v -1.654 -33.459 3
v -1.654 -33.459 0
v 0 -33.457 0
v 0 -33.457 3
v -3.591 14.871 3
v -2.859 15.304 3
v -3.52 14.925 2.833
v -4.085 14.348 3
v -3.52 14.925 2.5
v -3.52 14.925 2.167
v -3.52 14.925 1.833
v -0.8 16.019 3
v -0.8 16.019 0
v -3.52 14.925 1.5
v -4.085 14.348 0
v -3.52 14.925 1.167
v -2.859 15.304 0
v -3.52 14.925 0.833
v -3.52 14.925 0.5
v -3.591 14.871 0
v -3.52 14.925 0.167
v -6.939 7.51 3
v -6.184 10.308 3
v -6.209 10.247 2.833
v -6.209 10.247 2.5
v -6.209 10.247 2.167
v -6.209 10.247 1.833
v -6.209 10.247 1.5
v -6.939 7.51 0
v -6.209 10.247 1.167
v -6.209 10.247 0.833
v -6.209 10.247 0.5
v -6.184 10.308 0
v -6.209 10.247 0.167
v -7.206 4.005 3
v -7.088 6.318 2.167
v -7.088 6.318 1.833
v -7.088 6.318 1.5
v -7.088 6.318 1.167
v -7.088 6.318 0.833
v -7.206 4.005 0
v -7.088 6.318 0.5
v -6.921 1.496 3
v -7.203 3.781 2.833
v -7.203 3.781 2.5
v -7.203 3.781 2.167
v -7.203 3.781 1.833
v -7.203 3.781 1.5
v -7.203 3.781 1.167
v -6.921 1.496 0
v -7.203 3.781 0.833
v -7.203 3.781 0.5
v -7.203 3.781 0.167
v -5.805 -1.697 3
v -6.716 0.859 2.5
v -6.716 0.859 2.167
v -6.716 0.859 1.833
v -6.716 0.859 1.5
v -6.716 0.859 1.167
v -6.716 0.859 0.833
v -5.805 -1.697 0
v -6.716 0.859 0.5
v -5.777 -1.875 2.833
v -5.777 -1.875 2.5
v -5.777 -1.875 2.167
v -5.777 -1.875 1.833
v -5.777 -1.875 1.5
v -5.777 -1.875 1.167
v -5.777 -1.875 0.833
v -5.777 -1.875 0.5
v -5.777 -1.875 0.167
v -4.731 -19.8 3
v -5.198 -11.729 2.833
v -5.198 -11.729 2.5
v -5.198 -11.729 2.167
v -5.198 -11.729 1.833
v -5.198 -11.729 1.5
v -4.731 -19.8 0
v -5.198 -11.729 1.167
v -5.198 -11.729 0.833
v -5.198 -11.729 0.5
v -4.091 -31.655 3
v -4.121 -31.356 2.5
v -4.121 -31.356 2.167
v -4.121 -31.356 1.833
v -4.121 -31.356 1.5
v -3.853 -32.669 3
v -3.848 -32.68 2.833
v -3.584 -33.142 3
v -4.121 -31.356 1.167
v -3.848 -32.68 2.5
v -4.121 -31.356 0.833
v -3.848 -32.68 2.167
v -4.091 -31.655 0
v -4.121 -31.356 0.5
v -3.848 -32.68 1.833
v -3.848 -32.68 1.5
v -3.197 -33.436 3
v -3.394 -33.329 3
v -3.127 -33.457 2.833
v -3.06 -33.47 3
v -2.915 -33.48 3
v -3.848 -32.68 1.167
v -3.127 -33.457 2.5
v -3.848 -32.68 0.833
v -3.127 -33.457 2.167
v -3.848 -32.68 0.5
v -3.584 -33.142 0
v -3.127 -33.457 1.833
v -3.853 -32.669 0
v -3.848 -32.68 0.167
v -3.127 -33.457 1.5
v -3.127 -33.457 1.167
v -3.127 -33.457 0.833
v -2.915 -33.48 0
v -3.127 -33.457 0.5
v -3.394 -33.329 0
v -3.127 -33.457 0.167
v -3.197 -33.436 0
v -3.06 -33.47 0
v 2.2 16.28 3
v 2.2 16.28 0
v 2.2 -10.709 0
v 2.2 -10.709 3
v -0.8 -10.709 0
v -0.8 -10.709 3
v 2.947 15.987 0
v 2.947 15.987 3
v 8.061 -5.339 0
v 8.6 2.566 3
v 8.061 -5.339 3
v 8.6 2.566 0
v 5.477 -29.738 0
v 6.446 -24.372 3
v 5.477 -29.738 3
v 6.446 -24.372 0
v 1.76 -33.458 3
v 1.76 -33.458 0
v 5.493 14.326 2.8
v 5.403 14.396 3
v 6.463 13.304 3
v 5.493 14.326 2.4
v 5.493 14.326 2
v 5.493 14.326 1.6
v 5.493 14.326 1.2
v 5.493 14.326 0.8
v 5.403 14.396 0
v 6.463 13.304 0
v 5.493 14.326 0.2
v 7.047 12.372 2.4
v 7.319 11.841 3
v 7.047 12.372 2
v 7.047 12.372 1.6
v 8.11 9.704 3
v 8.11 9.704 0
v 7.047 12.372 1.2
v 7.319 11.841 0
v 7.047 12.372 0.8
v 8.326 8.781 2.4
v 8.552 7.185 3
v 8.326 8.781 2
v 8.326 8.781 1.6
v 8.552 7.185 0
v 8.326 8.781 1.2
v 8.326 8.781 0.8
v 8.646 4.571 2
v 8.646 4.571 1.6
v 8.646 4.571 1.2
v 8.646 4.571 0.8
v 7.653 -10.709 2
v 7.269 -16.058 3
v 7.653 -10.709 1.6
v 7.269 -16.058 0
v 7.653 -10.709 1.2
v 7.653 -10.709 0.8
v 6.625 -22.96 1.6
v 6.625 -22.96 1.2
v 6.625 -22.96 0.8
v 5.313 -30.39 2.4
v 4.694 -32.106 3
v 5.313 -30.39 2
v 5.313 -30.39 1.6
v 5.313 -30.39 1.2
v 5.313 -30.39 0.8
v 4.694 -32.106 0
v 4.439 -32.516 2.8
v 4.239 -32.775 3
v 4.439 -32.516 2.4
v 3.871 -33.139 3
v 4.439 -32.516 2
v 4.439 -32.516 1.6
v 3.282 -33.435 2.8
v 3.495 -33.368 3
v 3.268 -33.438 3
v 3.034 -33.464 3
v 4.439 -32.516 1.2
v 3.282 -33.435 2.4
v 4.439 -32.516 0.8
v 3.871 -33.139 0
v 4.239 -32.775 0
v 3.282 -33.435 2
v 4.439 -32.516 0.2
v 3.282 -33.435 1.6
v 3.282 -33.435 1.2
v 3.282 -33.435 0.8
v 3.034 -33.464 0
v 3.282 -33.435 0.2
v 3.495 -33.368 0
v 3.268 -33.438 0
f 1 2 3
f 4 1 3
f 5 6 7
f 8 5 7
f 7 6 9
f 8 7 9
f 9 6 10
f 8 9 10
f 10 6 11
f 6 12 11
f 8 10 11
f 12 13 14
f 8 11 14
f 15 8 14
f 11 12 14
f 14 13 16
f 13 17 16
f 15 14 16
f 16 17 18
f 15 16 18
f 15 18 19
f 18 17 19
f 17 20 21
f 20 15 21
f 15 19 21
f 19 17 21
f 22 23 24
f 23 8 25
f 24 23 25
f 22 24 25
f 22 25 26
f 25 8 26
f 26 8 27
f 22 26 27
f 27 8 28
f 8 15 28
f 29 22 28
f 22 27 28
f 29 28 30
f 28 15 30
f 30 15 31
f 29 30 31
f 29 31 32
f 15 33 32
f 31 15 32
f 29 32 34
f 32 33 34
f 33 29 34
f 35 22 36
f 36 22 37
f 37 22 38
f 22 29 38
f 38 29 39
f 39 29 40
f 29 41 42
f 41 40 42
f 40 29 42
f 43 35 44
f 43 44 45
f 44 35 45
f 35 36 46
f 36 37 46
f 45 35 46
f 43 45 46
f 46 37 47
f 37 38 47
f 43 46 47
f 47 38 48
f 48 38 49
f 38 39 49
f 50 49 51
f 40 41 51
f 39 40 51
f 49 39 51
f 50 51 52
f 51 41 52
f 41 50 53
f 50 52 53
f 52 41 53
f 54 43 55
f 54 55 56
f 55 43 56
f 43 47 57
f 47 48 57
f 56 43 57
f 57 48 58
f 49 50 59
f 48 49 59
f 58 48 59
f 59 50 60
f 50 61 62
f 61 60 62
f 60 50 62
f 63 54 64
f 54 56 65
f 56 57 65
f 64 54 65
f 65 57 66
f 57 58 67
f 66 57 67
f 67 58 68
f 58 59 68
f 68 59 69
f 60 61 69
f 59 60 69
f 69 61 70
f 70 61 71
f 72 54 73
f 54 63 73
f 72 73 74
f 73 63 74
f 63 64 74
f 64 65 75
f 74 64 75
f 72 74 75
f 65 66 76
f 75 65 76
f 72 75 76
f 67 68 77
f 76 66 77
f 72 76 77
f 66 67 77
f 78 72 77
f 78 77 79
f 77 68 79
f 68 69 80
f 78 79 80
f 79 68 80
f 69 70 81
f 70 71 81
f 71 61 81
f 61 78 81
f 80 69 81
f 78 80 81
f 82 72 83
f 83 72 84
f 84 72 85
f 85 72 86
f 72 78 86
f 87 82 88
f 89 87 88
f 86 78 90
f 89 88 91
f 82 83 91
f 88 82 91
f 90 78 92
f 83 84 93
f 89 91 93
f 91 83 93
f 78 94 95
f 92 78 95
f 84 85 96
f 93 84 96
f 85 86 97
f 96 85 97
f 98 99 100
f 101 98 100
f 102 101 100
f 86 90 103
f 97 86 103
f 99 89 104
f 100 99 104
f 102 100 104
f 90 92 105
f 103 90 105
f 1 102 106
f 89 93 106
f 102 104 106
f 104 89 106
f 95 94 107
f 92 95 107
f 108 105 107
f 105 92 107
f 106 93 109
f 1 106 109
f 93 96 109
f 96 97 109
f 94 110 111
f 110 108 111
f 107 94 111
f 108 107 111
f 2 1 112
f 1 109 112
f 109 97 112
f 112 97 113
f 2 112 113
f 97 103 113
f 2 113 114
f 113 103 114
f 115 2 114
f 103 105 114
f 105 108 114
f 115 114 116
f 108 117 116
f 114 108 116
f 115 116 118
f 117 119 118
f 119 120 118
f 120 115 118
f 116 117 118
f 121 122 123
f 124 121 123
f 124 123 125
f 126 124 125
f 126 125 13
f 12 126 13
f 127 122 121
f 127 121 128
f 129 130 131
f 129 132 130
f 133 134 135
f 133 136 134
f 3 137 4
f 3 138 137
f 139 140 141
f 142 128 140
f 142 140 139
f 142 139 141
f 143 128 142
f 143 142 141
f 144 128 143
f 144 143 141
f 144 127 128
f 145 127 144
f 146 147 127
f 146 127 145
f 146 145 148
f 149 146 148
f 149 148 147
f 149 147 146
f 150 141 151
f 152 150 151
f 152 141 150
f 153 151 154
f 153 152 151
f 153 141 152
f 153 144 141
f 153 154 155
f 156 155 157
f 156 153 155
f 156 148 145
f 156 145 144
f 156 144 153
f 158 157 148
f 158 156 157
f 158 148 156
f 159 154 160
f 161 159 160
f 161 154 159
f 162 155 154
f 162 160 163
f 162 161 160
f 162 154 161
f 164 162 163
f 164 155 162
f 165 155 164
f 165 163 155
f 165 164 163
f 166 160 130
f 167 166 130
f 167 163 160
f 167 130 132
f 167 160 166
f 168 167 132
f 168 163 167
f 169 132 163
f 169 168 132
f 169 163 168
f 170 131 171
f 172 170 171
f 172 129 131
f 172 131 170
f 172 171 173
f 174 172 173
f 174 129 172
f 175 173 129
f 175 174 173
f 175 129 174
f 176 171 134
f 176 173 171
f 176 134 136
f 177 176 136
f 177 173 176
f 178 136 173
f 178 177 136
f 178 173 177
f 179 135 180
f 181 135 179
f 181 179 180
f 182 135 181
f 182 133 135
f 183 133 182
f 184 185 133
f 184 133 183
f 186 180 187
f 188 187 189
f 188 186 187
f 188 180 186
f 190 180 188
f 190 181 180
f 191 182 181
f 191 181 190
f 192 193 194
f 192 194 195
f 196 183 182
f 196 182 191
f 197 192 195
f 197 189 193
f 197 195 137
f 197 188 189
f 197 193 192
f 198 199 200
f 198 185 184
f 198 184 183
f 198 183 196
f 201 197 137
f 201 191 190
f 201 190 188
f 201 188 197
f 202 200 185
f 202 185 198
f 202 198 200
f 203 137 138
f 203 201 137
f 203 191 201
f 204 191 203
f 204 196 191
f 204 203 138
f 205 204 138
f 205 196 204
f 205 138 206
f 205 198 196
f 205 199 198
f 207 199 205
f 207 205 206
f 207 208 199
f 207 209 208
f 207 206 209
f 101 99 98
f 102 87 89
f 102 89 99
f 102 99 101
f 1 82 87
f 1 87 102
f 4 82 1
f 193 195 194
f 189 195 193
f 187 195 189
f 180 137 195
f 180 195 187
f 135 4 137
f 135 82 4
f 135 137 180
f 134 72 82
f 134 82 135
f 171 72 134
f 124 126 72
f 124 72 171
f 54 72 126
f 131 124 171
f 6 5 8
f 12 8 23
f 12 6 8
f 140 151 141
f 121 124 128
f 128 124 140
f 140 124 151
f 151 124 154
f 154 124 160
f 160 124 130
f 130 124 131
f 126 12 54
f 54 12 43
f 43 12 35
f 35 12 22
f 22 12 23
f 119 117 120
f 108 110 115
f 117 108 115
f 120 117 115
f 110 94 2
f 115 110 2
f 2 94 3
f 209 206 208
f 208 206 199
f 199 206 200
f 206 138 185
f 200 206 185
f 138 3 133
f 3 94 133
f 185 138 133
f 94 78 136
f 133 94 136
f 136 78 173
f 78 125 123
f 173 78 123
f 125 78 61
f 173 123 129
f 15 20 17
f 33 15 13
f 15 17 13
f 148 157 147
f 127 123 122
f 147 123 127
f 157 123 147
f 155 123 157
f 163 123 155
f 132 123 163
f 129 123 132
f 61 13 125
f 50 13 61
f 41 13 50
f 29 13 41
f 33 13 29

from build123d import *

# Parameters (mm, degrees)
BOSS_EXTRUDE2_DEPTH = 3


with BuildPart() as part:
    # Sketch1 → Boss-Extrude2 (new body)
    with BuildSketch(Plane.XY):
        with BuildLine():
            Line((2.2, 16.279886141), (2.2, -10.708761049))
            Line((2.2, -10.708761049), (-0.8, -10.708761049))
            Line((-0.8, -10.708761049), (-0.8, 16.018581102))
            add(Edge.make_bspline(
                [(-0.8, 16.018581102), (-1.137478868, 15.856785997), (-3.864968928, 15.186605333), (-4.464345742, 13.377021915), (-6.530482393, 10.160494645), (-7.096283176, 6.815456141), (-7.276733446, 3.649960029), (-7.010269398, 1.222073445), (-6.038575888, -0.500882297), (-5.672315374, -2.248417909), (-5.576049901, -5.964143668), (-5.121301969, -12.748224887), (-4.586958941, -21.777676866), (-4.398323748, -28.542556317), (-4.010513221, -32.493968256), (-3.492878576, -33.581179885), (-2.482192268, -33.43229003), (-1.975490972, -33.453616216), (-1.143003818, -33.466552535), (-0.596113192, -33.477610231), (0, -33.457446809)],
                knots=[0.027253246, 0.027253246, 0.027253246, 0.027253246, 0.046558941, 0.096384933, 0.158729393, 0.228185604, 0.271981863, 0.323080185, 0.351299809, 0.373137697, 0.414663231, 0.543428447, 0.725126089, 0.882497072, 0.894014183, 0.929959464, 0.943400874, 0.960682688, 0.966342601, 1, 1, 1, 1], degree=3))
            add(Edge.make_bspline(
                [(2.2, 16.279886141), (2.963118532, 16.08662731), (3.37996516, 15.559355614), (5.774968787, 14.354576548), (7.374628283, 12.062982525), (8.551573886, 8.672556745), (8.733915125, 3.818962641), (8.281107455, -2.674085455), (7.534372428, -11.853726278), (6.9584282, -21.373551103), (5.820926037, -28.748739461), (4.775625382, -32.303859485), (3.657435413, -33.423016219), (2.72816559, -33.486469625), (2.15503926, -33.45689106), (1.117698349, -33.457739351), (0.476348767, -33.461224782), (0, -33.457446809)],
                knots=[0.025934593, 0.025934593, 0.025934593, 0.025934593, 0.066182788, 0.102078434, 0.144598721, 0.209520588, 0.28142744, 0.39133428, 0.542219823, 0.751598654, 0.880094026, 0.919233947, 0.943979088, 0.94911048, 0.968165935, 0.97349308, 1, 1, 1, 1], degree=3))
        make_face()
    extrude(amount=BOSS_EXTRUDE2_DEPTH)


solid = part.part
